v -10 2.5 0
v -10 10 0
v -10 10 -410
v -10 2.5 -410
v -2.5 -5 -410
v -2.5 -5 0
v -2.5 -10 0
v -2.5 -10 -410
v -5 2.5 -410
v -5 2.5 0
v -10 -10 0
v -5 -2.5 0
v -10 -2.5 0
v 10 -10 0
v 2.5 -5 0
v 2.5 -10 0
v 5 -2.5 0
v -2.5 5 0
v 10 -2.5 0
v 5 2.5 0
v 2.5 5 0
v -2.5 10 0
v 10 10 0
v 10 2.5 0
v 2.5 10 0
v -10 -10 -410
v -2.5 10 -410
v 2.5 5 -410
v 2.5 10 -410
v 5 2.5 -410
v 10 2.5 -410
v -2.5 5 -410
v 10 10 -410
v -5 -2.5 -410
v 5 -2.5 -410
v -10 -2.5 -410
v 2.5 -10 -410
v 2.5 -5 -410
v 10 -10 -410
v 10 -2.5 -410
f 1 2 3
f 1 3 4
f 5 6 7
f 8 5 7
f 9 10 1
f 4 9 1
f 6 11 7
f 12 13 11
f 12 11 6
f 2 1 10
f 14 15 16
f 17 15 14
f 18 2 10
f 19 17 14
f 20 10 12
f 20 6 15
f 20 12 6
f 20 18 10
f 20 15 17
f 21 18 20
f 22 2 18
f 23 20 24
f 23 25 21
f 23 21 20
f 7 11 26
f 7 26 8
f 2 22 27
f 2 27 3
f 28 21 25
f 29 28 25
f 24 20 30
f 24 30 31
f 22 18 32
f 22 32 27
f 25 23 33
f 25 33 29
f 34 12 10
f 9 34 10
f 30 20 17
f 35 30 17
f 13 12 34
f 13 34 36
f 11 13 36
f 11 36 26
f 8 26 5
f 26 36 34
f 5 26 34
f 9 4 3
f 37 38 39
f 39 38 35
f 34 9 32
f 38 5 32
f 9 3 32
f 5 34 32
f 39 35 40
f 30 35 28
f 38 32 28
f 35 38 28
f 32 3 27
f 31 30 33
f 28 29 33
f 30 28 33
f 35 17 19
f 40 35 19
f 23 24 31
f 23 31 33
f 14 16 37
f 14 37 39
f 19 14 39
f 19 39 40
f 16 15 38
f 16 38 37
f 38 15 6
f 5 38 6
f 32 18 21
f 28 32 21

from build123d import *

# Parameters (mm, degrees)
SKETCH1_W           = 20
SKETCH1_H           = 20
BOSS_EXTRUDE1_DEPTH = 410
SKETCH1_3_W         = 5
SKETCH1_3_H         = 10
CUT_EXTRUDE1_DEPTH  = 645
CIRPATTERN1_COUNT   = 4


with BuildPart() as part:
    # Sketch1 → Boss-Extrude1 (new body)
    with BuildSketch(Plane.XY):
        Rectangle(SKETCH1_W, SKETCH1_H)
    extrude(amount=-BOSS_EXTRUDE1_DEPTH)

    # Sketch1<3> → Cut-Extrude1 (cut)
    with BuildSketch(Plane.XY):
        with Locations((0, 10)):
            Rectangle(SKETCH1_3_W, SKETCH1_3_H)
    cut_extrude1 = extrude(amount=-CUT_EXTRUDE1_DEPTH, mode=Mode.SUBTRACT)

    # CirPattern1: Cut-Extrude1 ×4 about axis
    cirpattern1_axis = Axis((0, 0, -256.415447735), (0, 0, -1))
    for i in range(1, CIRPATTERN1_COUNT):
        add(cut_extrude1.rotate(cirpattern1_axis, i * 360 / CIRPATTERN1_COUNT), mode=Mode.SUBTRACT)


solid = part.part
